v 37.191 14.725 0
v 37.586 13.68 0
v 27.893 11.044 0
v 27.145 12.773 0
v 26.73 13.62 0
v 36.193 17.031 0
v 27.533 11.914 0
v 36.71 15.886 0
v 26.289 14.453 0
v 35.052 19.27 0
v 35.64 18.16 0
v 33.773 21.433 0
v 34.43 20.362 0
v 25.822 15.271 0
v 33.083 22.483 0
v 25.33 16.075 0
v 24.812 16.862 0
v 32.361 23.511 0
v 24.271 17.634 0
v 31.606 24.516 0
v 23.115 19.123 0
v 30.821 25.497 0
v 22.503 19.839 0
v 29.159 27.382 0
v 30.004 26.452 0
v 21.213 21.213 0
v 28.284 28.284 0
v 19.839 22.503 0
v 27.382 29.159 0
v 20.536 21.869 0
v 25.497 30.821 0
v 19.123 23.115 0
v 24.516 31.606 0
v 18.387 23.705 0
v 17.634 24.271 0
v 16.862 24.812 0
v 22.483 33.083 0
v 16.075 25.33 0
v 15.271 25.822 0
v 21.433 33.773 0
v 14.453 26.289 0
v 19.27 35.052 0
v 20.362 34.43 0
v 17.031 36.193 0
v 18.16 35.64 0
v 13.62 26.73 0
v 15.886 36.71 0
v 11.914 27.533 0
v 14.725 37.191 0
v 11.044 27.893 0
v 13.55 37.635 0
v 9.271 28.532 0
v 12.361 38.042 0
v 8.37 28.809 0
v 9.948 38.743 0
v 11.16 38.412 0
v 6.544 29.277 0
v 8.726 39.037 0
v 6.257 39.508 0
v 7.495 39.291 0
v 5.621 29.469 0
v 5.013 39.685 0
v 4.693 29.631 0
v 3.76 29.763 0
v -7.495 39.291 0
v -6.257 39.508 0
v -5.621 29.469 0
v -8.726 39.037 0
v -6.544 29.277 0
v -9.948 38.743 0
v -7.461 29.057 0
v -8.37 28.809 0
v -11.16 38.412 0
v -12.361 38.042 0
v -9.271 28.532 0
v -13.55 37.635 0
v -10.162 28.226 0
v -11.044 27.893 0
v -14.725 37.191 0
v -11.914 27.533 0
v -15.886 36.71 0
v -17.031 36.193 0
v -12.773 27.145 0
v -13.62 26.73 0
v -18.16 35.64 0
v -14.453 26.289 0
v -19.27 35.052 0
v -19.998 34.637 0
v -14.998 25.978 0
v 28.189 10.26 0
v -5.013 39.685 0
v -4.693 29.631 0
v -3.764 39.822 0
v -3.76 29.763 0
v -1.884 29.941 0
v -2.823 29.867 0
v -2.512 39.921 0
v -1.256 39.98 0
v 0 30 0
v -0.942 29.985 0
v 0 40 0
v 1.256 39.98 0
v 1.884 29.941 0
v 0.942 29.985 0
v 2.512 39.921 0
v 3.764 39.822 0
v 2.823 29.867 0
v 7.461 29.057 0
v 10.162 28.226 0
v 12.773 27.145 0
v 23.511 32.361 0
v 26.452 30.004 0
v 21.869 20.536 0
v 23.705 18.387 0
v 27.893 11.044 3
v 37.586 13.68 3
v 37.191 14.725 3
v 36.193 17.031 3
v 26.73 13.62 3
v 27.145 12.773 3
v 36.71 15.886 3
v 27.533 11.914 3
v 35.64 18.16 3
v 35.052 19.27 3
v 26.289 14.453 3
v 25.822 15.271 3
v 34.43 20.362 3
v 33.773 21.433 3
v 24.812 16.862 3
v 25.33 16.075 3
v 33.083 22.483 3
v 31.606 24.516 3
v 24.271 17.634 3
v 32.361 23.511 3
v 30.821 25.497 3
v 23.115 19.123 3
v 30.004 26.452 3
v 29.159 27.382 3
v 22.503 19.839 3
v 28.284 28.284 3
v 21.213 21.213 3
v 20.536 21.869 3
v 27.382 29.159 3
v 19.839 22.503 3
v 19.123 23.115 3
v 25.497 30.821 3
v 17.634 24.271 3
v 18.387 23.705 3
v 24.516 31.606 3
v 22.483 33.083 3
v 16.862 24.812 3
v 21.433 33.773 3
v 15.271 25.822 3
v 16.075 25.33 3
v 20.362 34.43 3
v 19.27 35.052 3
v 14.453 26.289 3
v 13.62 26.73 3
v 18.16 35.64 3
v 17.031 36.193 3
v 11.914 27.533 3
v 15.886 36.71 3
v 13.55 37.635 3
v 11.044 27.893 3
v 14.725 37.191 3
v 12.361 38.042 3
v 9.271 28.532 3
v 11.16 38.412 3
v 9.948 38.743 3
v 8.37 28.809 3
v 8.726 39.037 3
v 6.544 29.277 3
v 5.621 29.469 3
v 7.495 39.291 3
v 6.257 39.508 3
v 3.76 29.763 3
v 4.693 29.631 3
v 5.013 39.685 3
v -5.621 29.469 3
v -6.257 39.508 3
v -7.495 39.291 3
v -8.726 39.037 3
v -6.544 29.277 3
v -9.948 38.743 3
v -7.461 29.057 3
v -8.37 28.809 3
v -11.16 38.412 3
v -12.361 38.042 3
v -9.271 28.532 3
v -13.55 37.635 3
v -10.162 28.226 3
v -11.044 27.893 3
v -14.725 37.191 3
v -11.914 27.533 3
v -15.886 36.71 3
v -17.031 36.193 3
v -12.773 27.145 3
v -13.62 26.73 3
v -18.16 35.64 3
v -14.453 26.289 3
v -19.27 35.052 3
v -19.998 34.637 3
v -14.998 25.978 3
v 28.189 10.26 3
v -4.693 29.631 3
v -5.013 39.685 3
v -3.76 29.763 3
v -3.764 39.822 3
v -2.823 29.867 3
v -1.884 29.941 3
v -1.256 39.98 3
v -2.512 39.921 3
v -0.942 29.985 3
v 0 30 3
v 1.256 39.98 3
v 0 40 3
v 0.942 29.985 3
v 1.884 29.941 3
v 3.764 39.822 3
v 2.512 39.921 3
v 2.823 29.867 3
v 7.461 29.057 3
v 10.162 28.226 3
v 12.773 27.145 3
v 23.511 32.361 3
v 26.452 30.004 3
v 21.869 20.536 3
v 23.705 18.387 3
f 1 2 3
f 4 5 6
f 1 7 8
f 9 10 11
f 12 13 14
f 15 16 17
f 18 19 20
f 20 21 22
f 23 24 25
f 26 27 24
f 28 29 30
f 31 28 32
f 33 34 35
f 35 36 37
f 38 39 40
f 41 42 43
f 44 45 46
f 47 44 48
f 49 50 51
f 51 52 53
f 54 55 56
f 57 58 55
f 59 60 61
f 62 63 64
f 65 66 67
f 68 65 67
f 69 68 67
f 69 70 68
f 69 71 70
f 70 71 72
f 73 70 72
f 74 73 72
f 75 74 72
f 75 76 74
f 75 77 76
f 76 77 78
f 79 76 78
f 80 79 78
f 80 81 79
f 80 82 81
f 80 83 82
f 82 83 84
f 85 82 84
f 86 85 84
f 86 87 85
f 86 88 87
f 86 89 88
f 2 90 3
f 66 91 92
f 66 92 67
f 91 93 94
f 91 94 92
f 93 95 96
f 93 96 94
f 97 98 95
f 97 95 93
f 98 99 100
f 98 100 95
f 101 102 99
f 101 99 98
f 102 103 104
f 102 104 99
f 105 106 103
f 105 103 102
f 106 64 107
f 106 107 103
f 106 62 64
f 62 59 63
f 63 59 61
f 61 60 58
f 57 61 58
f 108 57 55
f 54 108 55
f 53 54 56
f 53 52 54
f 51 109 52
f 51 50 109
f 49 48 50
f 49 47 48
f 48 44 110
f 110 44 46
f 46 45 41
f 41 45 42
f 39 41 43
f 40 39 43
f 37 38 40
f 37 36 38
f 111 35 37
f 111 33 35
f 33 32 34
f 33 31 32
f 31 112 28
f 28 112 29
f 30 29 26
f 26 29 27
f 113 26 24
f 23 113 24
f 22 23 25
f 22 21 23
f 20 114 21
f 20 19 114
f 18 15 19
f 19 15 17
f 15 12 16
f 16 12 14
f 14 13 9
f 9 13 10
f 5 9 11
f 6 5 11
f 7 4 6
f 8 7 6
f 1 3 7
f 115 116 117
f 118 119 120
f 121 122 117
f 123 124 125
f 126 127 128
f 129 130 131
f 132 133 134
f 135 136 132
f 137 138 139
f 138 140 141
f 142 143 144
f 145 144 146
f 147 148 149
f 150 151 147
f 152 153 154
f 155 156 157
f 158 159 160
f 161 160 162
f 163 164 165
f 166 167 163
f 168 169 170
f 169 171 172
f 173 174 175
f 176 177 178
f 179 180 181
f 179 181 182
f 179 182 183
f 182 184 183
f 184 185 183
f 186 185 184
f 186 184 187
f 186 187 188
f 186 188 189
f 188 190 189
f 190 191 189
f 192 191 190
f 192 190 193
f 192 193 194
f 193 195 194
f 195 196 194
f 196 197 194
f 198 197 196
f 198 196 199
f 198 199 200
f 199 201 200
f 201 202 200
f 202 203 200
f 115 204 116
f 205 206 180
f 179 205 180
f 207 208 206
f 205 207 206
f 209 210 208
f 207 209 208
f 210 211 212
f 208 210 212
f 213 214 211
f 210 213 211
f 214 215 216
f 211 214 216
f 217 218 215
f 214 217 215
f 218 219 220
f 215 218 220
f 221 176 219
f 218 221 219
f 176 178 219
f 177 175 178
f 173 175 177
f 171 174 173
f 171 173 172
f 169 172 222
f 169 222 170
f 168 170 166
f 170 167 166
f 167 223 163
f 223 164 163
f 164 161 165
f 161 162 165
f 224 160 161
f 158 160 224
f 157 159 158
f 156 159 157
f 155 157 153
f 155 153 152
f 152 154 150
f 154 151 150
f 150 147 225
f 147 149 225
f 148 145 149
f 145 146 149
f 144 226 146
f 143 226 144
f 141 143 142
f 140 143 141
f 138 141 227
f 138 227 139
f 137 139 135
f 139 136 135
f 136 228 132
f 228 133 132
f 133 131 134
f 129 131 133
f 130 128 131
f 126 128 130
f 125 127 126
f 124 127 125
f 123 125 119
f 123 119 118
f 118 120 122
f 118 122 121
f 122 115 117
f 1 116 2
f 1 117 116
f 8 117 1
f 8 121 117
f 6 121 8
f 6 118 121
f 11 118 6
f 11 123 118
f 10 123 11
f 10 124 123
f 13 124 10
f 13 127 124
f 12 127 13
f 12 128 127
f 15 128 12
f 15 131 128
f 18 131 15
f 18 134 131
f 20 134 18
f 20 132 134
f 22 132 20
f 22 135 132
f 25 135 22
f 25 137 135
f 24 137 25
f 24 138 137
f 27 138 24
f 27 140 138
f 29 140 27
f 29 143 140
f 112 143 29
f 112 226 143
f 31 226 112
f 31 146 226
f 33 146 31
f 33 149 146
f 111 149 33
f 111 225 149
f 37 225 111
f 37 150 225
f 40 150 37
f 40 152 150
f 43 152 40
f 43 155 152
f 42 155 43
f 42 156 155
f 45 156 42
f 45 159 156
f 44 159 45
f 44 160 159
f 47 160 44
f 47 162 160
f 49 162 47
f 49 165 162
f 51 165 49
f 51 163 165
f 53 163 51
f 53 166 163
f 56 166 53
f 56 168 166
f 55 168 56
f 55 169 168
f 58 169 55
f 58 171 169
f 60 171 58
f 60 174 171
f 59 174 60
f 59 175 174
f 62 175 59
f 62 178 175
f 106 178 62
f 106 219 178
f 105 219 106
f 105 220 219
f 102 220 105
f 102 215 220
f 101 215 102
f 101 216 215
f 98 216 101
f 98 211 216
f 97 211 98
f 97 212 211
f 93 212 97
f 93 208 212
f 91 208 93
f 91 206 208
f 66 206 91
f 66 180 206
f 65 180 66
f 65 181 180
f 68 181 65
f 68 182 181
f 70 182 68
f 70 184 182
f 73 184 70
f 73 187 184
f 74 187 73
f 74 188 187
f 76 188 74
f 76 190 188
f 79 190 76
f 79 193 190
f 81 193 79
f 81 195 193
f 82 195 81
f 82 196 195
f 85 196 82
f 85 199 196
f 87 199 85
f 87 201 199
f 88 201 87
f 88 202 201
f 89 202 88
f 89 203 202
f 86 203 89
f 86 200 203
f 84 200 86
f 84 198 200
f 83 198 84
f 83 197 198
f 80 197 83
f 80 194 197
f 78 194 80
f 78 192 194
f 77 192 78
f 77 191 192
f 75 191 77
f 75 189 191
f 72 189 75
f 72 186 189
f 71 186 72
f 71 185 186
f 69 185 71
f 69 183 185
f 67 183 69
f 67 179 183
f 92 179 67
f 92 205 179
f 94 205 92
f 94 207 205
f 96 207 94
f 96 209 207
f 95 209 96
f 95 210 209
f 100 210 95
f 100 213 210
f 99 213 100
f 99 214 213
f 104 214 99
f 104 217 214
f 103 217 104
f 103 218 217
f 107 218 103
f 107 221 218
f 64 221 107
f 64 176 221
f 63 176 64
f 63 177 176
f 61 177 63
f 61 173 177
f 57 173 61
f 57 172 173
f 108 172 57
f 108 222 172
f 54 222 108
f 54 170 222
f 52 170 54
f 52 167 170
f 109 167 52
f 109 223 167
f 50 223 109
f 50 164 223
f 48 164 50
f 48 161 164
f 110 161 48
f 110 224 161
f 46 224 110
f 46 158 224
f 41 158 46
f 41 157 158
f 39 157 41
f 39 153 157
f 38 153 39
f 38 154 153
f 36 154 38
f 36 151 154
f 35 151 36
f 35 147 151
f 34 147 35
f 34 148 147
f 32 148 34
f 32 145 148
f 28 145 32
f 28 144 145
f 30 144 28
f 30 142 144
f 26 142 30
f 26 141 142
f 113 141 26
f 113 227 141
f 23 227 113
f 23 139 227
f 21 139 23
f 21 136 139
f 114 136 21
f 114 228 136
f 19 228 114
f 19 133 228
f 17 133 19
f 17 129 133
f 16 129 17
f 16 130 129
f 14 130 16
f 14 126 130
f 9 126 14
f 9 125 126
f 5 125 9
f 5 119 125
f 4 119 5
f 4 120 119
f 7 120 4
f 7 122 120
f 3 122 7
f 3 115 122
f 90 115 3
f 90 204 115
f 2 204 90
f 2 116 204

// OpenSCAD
module arc(r1, r2, a1, a2, h) {
  r_outer = max(r1, r2);
  r_inner = min(r1, r2);
  clockwise = (a2 < a1);

  angle_diff = clockwise 
    ? (360 - a1 + a2) 
    : (a2 - a1);

  steps = max(5, ceil(angle_diff)); // más pasos = más suave

  linear_extrude(h)
  intersection() {
  difference() {
    circle(r = r_outer, $fn=steps * 2);
    circle(r = r_inner, $fn=steps * 2);
  }

  polygon(concat([[0, 0]],
    [ for (i = [0:steps]) 
      let(a = a1 + (angle_diff * i / steps)) 
      [ cos(a) * (r_outer + 10), sin(a) * (r_outer + 10) ]
    ]));
  }
}

arc(
  r1 = 30,
  r2 = 40,
  a1 = 20,
  a2 = 120,
  h = 3
);
